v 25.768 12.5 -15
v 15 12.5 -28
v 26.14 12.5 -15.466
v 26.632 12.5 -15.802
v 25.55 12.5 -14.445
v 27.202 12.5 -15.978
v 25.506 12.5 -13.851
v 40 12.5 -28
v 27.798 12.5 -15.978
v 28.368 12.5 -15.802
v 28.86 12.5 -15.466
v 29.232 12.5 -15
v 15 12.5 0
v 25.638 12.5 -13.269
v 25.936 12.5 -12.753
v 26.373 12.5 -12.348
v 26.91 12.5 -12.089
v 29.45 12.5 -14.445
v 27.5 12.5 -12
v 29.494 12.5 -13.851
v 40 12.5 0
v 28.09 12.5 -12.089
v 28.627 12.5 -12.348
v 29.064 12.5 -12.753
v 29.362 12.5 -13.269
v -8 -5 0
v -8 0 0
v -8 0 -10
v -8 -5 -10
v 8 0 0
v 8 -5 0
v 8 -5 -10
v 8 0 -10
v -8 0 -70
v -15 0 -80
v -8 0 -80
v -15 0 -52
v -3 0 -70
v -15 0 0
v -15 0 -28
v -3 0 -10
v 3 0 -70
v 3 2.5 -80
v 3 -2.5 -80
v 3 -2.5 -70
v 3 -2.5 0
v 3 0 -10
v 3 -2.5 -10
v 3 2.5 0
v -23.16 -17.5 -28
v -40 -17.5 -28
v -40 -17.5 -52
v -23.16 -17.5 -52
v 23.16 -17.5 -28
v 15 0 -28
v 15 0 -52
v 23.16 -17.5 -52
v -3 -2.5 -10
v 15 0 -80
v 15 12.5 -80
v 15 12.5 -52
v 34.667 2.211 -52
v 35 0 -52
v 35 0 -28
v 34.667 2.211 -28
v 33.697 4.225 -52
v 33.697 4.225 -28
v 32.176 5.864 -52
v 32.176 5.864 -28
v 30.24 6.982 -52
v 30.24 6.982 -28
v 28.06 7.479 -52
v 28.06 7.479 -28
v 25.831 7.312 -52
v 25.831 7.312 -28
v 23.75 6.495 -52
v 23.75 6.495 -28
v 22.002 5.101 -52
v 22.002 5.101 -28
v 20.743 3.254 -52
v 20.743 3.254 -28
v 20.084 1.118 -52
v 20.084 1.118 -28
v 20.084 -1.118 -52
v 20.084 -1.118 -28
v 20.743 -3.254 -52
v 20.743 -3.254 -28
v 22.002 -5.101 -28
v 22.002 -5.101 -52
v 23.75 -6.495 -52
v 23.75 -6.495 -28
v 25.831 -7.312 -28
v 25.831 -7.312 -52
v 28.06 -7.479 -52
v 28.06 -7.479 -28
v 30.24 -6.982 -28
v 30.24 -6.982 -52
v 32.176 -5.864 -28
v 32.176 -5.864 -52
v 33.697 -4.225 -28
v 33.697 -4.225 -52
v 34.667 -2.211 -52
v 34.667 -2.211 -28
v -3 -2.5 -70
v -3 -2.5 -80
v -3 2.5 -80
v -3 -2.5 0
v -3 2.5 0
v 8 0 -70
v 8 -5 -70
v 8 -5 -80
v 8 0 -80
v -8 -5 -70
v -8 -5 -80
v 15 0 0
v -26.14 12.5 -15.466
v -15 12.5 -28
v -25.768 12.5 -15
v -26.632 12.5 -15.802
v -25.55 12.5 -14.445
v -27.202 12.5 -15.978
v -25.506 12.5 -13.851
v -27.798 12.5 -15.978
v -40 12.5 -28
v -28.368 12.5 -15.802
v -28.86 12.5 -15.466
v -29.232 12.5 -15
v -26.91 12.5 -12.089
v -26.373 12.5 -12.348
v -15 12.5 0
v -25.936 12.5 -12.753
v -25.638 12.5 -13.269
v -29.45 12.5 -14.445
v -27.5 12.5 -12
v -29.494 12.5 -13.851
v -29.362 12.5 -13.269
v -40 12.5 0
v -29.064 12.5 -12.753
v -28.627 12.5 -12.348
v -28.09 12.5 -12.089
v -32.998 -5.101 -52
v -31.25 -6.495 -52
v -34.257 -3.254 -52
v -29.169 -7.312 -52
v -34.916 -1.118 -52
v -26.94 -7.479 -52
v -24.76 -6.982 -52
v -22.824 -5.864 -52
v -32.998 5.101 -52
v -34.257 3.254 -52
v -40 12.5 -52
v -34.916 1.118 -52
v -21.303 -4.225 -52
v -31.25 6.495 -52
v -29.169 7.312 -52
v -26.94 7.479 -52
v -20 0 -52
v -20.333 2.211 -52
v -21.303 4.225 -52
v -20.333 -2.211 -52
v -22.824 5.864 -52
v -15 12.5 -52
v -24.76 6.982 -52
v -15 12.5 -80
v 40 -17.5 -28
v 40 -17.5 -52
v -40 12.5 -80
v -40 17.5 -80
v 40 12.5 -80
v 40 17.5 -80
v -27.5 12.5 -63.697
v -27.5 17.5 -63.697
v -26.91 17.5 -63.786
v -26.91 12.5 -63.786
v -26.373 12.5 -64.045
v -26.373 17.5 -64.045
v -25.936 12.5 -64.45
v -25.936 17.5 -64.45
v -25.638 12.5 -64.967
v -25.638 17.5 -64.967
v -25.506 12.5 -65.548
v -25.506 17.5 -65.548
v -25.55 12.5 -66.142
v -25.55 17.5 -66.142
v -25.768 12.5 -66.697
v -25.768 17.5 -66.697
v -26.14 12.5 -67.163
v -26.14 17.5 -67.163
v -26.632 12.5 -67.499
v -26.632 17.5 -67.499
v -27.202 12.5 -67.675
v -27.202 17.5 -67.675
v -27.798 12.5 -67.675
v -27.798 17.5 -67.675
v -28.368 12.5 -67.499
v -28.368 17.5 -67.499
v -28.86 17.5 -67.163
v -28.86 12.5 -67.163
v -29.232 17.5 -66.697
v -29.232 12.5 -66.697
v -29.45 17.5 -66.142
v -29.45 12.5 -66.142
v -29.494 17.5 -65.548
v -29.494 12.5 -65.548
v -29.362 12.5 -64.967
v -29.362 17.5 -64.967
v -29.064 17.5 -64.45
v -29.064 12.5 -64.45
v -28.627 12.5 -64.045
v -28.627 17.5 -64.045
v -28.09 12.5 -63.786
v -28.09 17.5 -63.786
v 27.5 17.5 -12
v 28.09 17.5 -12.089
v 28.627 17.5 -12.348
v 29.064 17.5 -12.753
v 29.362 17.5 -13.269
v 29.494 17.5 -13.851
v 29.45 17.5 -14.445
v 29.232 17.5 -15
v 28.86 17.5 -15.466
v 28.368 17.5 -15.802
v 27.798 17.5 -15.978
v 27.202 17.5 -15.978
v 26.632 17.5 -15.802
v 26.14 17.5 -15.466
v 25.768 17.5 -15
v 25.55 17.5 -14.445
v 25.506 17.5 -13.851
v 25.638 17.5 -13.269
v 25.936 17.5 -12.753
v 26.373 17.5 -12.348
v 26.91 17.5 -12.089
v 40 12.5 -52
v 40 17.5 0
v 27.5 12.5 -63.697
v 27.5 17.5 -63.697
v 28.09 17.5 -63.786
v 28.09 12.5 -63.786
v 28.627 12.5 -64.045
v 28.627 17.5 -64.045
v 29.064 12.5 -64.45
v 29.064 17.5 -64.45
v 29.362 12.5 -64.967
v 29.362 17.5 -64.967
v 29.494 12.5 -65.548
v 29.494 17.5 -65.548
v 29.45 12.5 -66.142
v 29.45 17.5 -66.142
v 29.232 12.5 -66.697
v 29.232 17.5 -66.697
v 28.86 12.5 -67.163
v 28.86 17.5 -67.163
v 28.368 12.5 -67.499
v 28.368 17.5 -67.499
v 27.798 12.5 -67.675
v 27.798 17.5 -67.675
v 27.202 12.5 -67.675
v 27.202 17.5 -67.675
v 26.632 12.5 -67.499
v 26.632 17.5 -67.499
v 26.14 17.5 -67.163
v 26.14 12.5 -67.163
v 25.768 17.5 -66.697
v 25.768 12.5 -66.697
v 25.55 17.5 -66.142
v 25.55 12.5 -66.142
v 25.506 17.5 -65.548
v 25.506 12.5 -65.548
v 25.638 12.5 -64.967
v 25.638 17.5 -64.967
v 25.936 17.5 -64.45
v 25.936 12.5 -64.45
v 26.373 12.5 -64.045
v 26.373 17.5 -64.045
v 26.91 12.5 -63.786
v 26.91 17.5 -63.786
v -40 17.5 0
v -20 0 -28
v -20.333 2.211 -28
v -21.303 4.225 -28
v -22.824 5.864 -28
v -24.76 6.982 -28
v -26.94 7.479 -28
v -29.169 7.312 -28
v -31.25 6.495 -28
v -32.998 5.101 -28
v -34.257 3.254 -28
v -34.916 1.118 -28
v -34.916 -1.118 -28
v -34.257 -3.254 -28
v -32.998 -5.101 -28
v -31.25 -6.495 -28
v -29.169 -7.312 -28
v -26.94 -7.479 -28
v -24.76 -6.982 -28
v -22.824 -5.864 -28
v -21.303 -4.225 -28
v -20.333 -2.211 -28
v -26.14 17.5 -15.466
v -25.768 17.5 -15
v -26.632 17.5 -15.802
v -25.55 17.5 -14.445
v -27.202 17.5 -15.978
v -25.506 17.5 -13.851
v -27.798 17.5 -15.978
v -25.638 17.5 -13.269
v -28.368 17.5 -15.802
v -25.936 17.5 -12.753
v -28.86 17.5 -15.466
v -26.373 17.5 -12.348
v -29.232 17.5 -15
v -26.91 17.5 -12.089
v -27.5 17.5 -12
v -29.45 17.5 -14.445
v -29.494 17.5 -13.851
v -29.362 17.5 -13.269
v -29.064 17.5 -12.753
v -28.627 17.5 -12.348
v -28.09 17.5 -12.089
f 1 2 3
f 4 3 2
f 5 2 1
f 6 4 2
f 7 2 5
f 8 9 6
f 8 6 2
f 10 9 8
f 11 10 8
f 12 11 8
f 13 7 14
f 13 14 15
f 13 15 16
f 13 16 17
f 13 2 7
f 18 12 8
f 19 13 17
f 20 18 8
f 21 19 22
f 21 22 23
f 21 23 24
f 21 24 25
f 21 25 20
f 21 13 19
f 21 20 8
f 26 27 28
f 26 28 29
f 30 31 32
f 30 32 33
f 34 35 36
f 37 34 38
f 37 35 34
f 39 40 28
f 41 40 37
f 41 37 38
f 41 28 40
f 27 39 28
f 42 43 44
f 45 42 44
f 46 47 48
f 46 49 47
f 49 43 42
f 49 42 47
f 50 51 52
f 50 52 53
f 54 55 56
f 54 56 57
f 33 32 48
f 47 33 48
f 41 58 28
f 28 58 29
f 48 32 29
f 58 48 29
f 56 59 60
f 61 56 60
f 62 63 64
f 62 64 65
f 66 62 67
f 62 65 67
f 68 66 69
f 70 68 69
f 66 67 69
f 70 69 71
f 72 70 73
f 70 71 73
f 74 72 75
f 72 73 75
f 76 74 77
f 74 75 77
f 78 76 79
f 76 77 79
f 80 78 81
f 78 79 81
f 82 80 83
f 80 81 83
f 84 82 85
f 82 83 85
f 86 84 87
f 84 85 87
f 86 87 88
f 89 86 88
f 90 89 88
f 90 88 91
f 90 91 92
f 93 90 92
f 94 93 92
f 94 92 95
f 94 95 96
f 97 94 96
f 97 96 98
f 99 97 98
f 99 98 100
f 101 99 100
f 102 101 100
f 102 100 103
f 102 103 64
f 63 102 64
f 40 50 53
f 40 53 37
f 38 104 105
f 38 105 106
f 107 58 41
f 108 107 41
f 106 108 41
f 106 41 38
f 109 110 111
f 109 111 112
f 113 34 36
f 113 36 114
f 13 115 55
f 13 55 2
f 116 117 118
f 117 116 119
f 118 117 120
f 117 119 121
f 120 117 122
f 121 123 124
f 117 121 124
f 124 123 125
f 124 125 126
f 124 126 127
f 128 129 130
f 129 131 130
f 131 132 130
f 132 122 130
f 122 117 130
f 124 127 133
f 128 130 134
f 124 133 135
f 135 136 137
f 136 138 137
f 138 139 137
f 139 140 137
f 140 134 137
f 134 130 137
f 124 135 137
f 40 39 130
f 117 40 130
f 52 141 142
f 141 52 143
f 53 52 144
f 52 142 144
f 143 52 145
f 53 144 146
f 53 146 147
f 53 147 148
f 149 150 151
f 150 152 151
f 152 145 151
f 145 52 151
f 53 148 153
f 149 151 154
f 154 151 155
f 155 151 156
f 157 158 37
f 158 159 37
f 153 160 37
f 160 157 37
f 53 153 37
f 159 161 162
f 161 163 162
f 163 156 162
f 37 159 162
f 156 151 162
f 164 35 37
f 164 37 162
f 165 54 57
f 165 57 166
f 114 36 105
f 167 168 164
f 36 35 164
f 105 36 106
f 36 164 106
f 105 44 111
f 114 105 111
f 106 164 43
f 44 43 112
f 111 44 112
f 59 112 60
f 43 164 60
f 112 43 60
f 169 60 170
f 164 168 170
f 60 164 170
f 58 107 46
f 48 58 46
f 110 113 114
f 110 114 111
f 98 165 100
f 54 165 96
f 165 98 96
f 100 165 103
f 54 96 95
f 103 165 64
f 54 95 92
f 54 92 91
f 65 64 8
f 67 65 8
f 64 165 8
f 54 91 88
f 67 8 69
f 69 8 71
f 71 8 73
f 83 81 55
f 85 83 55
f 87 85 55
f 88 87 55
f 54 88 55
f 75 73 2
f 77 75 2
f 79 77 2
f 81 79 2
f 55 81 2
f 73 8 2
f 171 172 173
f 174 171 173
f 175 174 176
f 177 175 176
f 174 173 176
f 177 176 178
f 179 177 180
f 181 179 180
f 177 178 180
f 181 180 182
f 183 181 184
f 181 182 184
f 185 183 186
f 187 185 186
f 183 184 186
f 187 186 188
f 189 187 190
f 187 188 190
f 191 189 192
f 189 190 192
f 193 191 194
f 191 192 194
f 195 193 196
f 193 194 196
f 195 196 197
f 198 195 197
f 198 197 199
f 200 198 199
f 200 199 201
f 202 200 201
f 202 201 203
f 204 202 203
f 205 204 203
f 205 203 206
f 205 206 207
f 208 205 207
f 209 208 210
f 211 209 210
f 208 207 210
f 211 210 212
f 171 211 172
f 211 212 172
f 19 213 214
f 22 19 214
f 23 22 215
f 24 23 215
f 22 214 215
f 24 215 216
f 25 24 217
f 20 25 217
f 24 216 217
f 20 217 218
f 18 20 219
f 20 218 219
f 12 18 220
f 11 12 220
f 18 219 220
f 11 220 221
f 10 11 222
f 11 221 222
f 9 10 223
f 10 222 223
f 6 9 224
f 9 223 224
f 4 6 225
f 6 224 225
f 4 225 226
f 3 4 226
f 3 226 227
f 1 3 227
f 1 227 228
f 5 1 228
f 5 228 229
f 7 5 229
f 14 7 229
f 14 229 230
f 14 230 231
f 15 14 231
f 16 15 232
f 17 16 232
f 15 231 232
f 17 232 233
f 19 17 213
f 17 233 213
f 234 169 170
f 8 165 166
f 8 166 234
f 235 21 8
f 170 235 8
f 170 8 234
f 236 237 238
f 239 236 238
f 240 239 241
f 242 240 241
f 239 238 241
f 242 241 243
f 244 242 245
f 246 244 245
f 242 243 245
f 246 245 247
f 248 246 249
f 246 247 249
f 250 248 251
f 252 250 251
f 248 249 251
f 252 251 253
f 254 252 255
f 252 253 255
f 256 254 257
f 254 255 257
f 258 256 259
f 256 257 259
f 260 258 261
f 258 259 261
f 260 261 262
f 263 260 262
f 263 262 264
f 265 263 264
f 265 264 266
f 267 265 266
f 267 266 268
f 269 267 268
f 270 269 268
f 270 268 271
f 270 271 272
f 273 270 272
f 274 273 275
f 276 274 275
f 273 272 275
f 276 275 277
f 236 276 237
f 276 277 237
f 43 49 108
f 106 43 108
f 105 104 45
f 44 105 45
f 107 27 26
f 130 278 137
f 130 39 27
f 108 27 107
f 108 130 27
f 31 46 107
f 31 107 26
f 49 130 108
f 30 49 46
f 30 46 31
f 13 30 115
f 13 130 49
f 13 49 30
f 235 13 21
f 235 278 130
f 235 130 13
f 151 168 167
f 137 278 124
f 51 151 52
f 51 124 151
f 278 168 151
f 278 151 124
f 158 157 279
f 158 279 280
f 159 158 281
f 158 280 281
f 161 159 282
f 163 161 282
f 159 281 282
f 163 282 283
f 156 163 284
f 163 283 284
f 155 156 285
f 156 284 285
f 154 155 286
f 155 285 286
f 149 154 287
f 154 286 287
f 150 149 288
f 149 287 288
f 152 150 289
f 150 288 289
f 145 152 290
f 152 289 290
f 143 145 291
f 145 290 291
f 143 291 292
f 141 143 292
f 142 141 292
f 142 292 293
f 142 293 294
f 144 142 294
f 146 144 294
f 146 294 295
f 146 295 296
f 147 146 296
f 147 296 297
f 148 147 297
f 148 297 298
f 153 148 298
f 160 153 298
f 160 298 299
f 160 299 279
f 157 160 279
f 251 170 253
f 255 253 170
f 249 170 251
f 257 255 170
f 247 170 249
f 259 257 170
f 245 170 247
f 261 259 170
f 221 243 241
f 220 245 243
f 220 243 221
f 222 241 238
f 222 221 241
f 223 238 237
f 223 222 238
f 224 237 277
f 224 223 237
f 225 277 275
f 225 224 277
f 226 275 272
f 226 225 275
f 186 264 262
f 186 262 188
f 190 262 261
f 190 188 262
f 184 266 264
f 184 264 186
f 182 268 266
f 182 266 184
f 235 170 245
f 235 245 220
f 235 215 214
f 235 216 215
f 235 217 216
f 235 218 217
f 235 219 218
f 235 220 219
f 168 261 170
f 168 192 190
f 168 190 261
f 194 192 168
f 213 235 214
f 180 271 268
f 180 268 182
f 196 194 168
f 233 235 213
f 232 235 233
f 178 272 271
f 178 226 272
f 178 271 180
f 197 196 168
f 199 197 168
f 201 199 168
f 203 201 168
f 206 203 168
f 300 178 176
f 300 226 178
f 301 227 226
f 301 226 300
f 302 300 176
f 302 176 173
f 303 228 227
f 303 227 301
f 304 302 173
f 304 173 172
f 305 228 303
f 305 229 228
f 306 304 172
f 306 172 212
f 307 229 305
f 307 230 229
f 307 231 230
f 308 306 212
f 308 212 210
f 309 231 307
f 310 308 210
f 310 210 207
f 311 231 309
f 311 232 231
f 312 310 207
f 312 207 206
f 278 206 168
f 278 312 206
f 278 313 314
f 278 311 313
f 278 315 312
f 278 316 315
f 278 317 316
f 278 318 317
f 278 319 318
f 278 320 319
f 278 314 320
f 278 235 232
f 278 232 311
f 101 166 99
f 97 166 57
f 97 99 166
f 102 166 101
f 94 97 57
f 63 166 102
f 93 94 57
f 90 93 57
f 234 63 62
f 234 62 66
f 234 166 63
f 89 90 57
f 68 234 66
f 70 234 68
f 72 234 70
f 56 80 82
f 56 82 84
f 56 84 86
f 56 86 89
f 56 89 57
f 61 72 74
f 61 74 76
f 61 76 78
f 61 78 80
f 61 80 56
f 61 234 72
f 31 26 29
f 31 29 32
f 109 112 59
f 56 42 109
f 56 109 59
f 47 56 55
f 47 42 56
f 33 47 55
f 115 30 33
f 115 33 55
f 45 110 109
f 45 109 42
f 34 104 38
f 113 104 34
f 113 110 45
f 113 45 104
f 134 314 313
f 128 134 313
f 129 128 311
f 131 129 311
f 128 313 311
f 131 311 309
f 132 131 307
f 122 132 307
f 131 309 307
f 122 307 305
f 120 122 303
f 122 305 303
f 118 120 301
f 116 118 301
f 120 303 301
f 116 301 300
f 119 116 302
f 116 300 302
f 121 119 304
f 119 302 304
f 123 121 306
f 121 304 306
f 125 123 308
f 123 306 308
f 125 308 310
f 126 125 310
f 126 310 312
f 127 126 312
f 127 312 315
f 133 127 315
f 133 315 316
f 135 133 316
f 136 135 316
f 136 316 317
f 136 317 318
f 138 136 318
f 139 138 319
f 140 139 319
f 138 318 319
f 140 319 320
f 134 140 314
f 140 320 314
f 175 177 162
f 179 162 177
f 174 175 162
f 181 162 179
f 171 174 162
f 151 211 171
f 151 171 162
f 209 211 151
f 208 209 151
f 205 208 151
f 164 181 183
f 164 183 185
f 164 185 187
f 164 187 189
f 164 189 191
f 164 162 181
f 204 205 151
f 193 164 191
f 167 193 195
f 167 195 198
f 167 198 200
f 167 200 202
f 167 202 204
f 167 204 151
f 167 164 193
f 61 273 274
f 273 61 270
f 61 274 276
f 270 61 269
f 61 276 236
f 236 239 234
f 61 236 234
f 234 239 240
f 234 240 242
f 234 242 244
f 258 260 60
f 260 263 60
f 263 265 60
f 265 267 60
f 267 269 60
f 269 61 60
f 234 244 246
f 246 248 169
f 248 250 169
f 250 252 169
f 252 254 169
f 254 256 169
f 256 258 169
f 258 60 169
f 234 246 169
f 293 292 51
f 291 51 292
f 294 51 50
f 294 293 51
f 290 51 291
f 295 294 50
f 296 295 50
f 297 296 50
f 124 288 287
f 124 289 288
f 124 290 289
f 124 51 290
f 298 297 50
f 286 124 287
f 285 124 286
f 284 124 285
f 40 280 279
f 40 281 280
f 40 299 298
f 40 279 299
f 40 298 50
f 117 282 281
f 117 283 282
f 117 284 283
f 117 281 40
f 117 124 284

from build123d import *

# Parameters (mm, degrees)
SKETCH2_R           = 7.5
BOSS_EXTRUDE2_DEPTH = 80
SKETCH5_W           = 16
SKETCH5_H           = 60
CUT_EXTRUDE5_DEPTH  = 5
CUT_EXTRUDE6_DEPTH  = 28
CUT_EXTRUDE7_DEPTH  = 28
SKETCH8_R           = 2
CUT_EXTRUDE8_DEPTH  = 5


with BuildPart() as part:
    # Sketch2 → Boss-Extrude2 (new body)
    with BuildSketch(Plane.XY):
        Polygon((8, 0), (15, 0), (23.160384018, -17.5), (40, -17.5), (40, 17.5), (0, 17.5), (-40, 17.5), (-40, -17.5), (-23.160384018, -17.5), (-15, 0), (-8, 0), (-8, -5), (8, -5), align=None)
        with Locations((-27.5, 0)):
            Circle(SKETCH2_R, mode=Mode.SUBTRACT)
        with Locations((27.5, 0)):
            Circle(SKETCH2_R, mode=Mode.SUBTRACT)
        Polygon((-3, 0), (-3, -2.5), (3, -2.5), (3, 0), (3, 2.5), (-3, 2.5), align=None, mode=Mode.SUBTRACT)
    extrude(amount=-BOSS_EXTRUDE2_DEPTH)

    # Sketch5 → Cut-Extrude5 (cut)
    with BuildSketch(Plane(origin=(0, -5, 0), x_dir=(-1, 0, 0), z_dir=(0, -1, 0))):
        with Locations((0, 40)):
            Rectangle(SKETCH5_W, SKETCH5_H)
    extrude(amount=-CUT_EXTRUDE5_DEPTH, mode=Mode.SUBTRACT)

    # Sketch6 → Cut-Extrude6 (cut)
    with BuildSketch(Plane.XY):
        Polygon((-40, 12.5), (-40, -17.5), (-23.160384018, -17.5), (-15, 0), (-15, 12.5), align=None)
        Polygon((40, 12.5), (40, -17.5), (23.160384018, -17.5), (15, 0), (15, 12.5), align=None)
    extrude(amount=-CUT_EXTRUDE6_DEPTH, mode=Mode.SUBTRACT)

    # Sketch7 → Cut-Extrude7 (cut)
    with BuildSketch(Plane(origin=(0, 0, -80), x_dir=(-1, 0, 0), z_dir=(0, 0, -1))):
        Polygon((-40, 12.5), (-40, -17.5), (-23.160384018, -17.5), (-15, 0), (-15, 12.5), align=None)
        Polygon((40, 12.5), (40, -17.5), (23.160384018, -17.5), (15, 0), (15, 12.5), align=None)
    extrude(amount=-CUT_EXTRUDE7_DEPTH, mode=Mode.SUBTRACT)

    # Sketch8 → Cut-Extrude8 (cut)
    with BuildSketch(Plane(origin=(0, 17.5, 0), x_dir=(1, 0, 0), z_dir=(0, 1, 0))):
        with Locations(Location((27.5, 14, 0), (0, 0, 270))):
            Circle(SKETCH8_R)
        with Locations(Location((-27.5, 14, 0), (0, 0, 270))):
            Circle(SKETCH8_R)
        with Locations(Location((-27.5, 65.697240355, 0), (0, 0, 270))):
            Circle(SKETCH8_R)
        with Locations(Location((27.5, 65.697240355, 0), (0, 0, 270))):
            Circle(SKETCH8_R)
    extrude(amount=-CUT_EXTRUDE8_DEPTH, mode=Mode.SUBTRACT)


solid = part.part
